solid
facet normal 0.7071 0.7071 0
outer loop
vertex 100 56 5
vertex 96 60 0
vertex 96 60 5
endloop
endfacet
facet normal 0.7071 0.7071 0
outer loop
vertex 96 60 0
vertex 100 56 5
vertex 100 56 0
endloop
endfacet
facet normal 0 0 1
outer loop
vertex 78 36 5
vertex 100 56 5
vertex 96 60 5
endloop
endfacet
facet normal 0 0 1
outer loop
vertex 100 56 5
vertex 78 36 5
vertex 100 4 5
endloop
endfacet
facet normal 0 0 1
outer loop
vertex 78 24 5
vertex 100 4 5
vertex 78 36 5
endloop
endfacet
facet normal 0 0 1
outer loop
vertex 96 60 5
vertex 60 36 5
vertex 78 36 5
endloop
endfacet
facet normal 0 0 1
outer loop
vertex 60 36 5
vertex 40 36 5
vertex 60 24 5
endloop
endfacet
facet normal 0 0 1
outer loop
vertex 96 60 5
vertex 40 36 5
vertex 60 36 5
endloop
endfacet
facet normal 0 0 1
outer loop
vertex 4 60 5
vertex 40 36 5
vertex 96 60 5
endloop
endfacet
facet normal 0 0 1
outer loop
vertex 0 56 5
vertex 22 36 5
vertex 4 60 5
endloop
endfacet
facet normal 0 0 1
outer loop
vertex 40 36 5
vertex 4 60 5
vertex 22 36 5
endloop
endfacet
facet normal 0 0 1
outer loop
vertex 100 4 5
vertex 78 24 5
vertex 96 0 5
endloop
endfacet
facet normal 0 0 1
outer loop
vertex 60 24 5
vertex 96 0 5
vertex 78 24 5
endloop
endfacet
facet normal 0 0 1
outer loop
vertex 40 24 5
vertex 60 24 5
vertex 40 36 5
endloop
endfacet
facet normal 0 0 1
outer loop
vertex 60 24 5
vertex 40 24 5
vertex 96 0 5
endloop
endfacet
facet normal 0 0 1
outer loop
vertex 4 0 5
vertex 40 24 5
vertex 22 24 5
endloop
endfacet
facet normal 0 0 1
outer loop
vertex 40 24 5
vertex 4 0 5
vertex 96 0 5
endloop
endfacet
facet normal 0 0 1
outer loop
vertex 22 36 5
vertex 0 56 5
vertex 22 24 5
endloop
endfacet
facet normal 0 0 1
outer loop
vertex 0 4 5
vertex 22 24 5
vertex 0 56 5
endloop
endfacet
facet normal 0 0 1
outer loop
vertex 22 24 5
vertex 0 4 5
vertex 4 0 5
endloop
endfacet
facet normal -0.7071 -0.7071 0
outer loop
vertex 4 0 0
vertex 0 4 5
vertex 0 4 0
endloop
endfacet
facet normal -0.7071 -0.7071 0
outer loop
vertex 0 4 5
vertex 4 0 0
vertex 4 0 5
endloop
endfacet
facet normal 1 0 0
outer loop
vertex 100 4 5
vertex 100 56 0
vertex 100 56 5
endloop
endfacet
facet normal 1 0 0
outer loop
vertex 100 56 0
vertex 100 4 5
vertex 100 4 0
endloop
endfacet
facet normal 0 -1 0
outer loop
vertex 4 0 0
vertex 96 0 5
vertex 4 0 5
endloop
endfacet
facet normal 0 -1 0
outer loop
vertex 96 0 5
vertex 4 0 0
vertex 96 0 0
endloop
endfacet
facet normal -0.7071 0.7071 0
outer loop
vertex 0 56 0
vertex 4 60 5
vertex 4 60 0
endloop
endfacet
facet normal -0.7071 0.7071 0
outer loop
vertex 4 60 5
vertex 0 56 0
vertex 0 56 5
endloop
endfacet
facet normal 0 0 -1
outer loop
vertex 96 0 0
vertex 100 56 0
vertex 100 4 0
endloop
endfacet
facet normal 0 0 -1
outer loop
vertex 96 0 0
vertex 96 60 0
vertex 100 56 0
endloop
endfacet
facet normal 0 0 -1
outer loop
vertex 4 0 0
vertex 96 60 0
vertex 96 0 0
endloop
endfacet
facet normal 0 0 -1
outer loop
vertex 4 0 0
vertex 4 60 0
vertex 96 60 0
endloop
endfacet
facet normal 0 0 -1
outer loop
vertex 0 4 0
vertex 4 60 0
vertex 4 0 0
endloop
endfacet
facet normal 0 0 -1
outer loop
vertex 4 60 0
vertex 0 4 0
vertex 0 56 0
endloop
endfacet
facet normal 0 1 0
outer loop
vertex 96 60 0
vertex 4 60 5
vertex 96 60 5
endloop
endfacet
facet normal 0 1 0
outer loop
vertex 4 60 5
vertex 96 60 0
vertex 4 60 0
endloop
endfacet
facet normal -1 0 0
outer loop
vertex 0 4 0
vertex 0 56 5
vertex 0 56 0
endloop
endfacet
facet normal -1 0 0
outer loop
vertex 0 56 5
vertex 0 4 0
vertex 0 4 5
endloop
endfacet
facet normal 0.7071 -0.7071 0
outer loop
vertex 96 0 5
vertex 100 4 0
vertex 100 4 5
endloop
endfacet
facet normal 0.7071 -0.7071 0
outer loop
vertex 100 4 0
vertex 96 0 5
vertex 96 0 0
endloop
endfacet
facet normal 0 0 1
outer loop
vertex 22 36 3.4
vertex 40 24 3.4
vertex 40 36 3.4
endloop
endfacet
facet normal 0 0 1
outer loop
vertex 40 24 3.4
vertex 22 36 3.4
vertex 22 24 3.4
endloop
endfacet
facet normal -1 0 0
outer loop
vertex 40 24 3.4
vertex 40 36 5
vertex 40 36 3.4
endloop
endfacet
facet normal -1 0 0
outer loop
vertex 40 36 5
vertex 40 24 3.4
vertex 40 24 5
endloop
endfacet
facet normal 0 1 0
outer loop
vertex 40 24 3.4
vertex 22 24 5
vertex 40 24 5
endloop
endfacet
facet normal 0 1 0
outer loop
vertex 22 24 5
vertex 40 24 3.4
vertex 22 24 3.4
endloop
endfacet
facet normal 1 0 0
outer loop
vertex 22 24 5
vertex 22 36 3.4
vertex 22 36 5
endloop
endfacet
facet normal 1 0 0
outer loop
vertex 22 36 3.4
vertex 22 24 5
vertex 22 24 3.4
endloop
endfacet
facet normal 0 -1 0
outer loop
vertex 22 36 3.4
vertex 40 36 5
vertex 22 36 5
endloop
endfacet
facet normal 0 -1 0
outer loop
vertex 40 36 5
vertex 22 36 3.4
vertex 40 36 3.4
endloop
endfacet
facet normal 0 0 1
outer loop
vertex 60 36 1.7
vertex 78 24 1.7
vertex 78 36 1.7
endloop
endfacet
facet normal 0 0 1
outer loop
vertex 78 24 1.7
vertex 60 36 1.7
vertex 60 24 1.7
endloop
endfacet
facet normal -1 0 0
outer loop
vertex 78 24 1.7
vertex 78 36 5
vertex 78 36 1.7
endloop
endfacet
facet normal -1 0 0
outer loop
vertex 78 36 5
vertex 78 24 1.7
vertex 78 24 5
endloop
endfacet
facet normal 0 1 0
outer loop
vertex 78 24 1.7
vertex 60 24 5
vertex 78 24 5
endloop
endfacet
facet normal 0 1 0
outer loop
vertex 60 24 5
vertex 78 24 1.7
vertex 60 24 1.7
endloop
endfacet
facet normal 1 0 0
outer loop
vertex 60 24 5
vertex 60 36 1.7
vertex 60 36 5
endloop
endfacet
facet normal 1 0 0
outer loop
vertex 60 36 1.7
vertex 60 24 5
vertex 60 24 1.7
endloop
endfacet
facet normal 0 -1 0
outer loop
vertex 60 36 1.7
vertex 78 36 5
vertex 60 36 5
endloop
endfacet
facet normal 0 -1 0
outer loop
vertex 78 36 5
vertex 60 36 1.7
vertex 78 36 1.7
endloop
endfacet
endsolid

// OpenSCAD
$fn = 32;

// ----------------------------------------------------------------------
// Windowed plate: 2 voids, 100 x 60 x 5 mm
// ----------------------------------------------------------------------

// --- parameters (mm) ---
plate_l = 100;            // plate length, X
plate_w = 60;             // plate width, Y
plate_t = 5;              // plate thickness, Z
edge_margin = 12;         // wall from the plate edge to any window
windows = 2;              // number of windows in the row
win_l = 18;               // window length
win_w = 12;               // window width
win_pitch = 38;           // window pitch along X
depth_1 = 1.6;            // depth of void 1 (full thickness = through)
depth_2 = 3.3;            // depth of void 2 (full thickness = through)
corner_c = 4;             // corner chamfer of the plate

profile = [[4, 0], [96, 0], [100, 4], [100, 56], [96, 60], [4, 60], [0, 56], [0, 4]];  // primary outline, 8 points, counter clockwise
void_1 = [[22, 24], [40, 24], [40, 36], [22, 36]];  // window 1 of the row, 4 points
void_2 = [[60, 24], [78, 24], [78, 36], [60, 36]];  // window 2 of the row, 4 points

// --- the one profile operation ---
difference() {
  linear_extrude(height = plate_t) polygon(points = profile);
  translate([0, 0, plate_t - depth_1])
    linear_extrude(height = depth_1 + 1) polygon(points = void_1);
  translate([0, 0, plate_t - depth_2])
    linear_extrude(height = depth_2 + 1) polygon(points = void_2);
}
